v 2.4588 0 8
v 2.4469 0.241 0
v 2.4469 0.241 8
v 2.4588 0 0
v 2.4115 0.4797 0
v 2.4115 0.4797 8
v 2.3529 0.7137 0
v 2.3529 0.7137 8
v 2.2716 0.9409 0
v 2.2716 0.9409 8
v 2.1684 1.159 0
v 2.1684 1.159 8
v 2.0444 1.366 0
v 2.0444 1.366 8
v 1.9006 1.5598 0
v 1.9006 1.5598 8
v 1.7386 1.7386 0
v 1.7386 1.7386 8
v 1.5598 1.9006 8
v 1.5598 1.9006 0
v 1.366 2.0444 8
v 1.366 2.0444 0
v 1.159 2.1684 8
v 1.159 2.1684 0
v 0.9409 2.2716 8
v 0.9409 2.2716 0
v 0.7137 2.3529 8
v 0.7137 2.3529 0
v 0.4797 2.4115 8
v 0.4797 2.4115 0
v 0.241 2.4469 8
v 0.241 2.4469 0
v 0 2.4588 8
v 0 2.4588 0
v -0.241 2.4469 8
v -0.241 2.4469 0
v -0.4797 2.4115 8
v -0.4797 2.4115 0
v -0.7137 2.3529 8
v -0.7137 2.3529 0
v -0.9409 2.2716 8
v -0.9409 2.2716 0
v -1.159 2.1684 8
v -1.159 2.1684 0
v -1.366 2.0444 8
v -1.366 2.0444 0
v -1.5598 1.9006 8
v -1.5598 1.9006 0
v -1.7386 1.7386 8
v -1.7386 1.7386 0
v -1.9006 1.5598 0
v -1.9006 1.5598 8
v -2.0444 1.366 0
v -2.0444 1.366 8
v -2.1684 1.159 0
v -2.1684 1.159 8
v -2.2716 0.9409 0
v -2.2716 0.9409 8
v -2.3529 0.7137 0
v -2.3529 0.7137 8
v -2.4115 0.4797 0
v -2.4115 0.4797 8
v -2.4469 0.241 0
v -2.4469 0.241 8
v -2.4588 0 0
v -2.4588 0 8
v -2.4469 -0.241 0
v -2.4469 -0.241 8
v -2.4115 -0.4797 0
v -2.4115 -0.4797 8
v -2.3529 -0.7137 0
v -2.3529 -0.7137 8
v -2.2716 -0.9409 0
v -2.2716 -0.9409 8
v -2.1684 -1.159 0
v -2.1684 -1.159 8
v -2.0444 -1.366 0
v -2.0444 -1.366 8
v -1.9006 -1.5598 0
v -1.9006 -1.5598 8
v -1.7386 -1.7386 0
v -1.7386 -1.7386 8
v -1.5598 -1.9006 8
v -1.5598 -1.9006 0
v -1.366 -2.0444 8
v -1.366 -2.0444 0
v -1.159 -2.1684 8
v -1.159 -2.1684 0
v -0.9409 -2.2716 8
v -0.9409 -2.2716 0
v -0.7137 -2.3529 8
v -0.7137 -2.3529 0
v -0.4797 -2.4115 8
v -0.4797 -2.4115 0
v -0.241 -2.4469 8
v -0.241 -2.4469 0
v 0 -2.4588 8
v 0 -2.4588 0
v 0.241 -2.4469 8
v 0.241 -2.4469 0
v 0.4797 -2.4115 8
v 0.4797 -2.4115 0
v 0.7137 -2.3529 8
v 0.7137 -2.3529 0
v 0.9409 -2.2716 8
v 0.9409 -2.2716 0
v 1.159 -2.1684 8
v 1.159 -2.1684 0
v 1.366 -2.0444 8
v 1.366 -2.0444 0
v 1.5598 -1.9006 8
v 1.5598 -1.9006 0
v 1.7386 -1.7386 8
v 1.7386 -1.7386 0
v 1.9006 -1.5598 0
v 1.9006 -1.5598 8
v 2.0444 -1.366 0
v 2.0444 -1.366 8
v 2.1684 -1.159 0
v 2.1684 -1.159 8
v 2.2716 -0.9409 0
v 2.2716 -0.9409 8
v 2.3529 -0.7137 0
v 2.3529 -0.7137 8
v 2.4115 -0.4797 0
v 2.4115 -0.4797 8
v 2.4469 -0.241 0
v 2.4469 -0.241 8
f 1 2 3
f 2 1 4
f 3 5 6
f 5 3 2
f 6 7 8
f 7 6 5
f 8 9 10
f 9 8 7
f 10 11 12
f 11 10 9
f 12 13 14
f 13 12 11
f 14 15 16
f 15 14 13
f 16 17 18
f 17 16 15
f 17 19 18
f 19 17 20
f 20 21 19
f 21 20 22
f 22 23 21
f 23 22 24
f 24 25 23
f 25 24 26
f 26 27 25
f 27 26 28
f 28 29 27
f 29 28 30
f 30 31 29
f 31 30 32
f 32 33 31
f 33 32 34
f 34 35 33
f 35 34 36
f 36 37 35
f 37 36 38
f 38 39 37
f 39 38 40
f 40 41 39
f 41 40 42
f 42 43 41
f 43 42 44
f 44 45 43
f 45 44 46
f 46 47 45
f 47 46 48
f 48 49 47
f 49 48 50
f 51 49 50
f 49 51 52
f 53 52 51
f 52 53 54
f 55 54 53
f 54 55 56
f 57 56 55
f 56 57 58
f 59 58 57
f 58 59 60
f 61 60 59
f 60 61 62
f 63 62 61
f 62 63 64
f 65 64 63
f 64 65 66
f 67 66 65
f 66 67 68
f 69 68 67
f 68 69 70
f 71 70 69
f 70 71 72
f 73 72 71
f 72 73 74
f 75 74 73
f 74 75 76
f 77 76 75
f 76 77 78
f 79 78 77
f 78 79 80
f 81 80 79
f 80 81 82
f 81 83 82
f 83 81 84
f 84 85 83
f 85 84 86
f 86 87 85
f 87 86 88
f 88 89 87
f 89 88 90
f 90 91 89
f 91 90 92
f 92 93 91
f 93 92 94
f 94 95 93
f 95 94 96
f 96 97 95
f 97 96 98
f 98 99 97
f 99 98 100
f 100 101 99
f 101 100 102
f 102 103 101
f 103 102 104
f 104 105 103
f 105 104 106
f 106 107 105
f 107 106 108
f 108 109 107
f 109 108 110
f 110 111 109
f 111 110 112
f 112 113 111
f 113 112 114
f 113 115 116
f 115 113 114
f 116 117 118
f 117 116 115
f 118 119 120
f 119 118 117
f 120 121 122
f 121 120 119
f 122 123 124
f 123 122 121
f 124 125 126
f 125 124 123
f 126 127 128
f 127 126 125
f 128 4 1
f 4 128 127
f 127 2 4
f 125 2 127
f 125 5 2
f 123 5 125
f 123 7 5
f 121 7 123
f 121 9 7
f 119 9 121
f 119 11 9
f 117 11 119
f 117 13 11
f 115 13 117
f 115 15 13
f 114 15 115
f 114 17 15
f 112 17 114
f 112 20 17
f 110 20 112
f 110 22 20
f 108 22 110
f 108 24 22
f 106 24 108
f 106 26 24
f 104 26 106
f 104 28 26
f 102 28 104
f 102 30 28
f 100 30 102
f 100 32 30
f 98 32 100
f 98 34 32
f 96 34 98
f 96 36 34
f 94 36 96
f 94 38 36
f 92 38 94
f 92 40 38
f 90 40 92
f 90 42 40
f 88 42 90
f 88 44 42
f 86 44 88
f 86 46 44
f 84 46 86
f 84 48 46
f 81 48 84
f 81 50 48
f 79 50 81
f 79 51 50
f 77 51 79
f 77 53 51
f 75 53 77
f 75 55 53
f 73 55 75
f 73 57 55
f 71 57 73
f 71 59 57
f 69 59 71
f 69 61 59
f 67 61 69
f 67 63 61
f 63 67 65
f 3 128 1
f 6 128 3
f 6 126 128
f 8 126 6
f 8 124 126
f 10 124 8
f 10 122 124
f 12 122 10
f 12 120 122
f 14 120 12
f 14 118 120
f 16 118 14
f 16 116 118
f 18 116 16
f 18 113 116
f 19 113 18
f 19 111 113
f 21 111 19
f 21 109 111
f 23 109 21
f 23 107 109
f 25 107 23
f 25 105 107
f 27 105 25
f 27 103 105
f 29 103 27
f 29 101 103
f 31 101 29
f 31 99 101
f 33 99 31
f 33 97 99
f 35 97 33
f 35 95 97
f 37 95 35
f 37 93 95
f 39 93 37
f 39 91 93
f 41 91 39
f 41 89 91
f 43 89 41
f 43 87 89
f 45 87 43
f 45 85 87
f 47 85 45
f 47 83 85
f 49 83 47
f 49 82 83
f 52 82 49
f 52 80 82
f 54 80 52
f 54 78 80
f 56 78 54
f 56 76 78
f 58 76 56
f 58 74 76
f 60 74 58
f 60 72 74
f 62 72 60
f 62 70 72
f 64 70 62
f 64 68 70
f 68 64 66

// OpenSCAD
// A set screw of the parts library (packages/contracts/src/parts/set-screws.ts), at the sizes given as -D overrides. `npm run
// check:assembly` renders it to check the set screws a model holds (e.g. the spring ball detent's adjustable preload). As
// parts/screws/screw.scad, the thread is drawn as a plain shank at its minor diameter (ISO 68-1: d - 1.0825 P), so that it clears
// the hole it is turned into; its hex socket is left out.
// Frame: millimetres, as the parts library's preview: the flat point on z = 0, the axis along Z, the socket end up.

D = 6;
PITCH = 1;
L = 8;

$fn = 64;
cylinder(d = D - 1.0825 * PITCH, h = L);
